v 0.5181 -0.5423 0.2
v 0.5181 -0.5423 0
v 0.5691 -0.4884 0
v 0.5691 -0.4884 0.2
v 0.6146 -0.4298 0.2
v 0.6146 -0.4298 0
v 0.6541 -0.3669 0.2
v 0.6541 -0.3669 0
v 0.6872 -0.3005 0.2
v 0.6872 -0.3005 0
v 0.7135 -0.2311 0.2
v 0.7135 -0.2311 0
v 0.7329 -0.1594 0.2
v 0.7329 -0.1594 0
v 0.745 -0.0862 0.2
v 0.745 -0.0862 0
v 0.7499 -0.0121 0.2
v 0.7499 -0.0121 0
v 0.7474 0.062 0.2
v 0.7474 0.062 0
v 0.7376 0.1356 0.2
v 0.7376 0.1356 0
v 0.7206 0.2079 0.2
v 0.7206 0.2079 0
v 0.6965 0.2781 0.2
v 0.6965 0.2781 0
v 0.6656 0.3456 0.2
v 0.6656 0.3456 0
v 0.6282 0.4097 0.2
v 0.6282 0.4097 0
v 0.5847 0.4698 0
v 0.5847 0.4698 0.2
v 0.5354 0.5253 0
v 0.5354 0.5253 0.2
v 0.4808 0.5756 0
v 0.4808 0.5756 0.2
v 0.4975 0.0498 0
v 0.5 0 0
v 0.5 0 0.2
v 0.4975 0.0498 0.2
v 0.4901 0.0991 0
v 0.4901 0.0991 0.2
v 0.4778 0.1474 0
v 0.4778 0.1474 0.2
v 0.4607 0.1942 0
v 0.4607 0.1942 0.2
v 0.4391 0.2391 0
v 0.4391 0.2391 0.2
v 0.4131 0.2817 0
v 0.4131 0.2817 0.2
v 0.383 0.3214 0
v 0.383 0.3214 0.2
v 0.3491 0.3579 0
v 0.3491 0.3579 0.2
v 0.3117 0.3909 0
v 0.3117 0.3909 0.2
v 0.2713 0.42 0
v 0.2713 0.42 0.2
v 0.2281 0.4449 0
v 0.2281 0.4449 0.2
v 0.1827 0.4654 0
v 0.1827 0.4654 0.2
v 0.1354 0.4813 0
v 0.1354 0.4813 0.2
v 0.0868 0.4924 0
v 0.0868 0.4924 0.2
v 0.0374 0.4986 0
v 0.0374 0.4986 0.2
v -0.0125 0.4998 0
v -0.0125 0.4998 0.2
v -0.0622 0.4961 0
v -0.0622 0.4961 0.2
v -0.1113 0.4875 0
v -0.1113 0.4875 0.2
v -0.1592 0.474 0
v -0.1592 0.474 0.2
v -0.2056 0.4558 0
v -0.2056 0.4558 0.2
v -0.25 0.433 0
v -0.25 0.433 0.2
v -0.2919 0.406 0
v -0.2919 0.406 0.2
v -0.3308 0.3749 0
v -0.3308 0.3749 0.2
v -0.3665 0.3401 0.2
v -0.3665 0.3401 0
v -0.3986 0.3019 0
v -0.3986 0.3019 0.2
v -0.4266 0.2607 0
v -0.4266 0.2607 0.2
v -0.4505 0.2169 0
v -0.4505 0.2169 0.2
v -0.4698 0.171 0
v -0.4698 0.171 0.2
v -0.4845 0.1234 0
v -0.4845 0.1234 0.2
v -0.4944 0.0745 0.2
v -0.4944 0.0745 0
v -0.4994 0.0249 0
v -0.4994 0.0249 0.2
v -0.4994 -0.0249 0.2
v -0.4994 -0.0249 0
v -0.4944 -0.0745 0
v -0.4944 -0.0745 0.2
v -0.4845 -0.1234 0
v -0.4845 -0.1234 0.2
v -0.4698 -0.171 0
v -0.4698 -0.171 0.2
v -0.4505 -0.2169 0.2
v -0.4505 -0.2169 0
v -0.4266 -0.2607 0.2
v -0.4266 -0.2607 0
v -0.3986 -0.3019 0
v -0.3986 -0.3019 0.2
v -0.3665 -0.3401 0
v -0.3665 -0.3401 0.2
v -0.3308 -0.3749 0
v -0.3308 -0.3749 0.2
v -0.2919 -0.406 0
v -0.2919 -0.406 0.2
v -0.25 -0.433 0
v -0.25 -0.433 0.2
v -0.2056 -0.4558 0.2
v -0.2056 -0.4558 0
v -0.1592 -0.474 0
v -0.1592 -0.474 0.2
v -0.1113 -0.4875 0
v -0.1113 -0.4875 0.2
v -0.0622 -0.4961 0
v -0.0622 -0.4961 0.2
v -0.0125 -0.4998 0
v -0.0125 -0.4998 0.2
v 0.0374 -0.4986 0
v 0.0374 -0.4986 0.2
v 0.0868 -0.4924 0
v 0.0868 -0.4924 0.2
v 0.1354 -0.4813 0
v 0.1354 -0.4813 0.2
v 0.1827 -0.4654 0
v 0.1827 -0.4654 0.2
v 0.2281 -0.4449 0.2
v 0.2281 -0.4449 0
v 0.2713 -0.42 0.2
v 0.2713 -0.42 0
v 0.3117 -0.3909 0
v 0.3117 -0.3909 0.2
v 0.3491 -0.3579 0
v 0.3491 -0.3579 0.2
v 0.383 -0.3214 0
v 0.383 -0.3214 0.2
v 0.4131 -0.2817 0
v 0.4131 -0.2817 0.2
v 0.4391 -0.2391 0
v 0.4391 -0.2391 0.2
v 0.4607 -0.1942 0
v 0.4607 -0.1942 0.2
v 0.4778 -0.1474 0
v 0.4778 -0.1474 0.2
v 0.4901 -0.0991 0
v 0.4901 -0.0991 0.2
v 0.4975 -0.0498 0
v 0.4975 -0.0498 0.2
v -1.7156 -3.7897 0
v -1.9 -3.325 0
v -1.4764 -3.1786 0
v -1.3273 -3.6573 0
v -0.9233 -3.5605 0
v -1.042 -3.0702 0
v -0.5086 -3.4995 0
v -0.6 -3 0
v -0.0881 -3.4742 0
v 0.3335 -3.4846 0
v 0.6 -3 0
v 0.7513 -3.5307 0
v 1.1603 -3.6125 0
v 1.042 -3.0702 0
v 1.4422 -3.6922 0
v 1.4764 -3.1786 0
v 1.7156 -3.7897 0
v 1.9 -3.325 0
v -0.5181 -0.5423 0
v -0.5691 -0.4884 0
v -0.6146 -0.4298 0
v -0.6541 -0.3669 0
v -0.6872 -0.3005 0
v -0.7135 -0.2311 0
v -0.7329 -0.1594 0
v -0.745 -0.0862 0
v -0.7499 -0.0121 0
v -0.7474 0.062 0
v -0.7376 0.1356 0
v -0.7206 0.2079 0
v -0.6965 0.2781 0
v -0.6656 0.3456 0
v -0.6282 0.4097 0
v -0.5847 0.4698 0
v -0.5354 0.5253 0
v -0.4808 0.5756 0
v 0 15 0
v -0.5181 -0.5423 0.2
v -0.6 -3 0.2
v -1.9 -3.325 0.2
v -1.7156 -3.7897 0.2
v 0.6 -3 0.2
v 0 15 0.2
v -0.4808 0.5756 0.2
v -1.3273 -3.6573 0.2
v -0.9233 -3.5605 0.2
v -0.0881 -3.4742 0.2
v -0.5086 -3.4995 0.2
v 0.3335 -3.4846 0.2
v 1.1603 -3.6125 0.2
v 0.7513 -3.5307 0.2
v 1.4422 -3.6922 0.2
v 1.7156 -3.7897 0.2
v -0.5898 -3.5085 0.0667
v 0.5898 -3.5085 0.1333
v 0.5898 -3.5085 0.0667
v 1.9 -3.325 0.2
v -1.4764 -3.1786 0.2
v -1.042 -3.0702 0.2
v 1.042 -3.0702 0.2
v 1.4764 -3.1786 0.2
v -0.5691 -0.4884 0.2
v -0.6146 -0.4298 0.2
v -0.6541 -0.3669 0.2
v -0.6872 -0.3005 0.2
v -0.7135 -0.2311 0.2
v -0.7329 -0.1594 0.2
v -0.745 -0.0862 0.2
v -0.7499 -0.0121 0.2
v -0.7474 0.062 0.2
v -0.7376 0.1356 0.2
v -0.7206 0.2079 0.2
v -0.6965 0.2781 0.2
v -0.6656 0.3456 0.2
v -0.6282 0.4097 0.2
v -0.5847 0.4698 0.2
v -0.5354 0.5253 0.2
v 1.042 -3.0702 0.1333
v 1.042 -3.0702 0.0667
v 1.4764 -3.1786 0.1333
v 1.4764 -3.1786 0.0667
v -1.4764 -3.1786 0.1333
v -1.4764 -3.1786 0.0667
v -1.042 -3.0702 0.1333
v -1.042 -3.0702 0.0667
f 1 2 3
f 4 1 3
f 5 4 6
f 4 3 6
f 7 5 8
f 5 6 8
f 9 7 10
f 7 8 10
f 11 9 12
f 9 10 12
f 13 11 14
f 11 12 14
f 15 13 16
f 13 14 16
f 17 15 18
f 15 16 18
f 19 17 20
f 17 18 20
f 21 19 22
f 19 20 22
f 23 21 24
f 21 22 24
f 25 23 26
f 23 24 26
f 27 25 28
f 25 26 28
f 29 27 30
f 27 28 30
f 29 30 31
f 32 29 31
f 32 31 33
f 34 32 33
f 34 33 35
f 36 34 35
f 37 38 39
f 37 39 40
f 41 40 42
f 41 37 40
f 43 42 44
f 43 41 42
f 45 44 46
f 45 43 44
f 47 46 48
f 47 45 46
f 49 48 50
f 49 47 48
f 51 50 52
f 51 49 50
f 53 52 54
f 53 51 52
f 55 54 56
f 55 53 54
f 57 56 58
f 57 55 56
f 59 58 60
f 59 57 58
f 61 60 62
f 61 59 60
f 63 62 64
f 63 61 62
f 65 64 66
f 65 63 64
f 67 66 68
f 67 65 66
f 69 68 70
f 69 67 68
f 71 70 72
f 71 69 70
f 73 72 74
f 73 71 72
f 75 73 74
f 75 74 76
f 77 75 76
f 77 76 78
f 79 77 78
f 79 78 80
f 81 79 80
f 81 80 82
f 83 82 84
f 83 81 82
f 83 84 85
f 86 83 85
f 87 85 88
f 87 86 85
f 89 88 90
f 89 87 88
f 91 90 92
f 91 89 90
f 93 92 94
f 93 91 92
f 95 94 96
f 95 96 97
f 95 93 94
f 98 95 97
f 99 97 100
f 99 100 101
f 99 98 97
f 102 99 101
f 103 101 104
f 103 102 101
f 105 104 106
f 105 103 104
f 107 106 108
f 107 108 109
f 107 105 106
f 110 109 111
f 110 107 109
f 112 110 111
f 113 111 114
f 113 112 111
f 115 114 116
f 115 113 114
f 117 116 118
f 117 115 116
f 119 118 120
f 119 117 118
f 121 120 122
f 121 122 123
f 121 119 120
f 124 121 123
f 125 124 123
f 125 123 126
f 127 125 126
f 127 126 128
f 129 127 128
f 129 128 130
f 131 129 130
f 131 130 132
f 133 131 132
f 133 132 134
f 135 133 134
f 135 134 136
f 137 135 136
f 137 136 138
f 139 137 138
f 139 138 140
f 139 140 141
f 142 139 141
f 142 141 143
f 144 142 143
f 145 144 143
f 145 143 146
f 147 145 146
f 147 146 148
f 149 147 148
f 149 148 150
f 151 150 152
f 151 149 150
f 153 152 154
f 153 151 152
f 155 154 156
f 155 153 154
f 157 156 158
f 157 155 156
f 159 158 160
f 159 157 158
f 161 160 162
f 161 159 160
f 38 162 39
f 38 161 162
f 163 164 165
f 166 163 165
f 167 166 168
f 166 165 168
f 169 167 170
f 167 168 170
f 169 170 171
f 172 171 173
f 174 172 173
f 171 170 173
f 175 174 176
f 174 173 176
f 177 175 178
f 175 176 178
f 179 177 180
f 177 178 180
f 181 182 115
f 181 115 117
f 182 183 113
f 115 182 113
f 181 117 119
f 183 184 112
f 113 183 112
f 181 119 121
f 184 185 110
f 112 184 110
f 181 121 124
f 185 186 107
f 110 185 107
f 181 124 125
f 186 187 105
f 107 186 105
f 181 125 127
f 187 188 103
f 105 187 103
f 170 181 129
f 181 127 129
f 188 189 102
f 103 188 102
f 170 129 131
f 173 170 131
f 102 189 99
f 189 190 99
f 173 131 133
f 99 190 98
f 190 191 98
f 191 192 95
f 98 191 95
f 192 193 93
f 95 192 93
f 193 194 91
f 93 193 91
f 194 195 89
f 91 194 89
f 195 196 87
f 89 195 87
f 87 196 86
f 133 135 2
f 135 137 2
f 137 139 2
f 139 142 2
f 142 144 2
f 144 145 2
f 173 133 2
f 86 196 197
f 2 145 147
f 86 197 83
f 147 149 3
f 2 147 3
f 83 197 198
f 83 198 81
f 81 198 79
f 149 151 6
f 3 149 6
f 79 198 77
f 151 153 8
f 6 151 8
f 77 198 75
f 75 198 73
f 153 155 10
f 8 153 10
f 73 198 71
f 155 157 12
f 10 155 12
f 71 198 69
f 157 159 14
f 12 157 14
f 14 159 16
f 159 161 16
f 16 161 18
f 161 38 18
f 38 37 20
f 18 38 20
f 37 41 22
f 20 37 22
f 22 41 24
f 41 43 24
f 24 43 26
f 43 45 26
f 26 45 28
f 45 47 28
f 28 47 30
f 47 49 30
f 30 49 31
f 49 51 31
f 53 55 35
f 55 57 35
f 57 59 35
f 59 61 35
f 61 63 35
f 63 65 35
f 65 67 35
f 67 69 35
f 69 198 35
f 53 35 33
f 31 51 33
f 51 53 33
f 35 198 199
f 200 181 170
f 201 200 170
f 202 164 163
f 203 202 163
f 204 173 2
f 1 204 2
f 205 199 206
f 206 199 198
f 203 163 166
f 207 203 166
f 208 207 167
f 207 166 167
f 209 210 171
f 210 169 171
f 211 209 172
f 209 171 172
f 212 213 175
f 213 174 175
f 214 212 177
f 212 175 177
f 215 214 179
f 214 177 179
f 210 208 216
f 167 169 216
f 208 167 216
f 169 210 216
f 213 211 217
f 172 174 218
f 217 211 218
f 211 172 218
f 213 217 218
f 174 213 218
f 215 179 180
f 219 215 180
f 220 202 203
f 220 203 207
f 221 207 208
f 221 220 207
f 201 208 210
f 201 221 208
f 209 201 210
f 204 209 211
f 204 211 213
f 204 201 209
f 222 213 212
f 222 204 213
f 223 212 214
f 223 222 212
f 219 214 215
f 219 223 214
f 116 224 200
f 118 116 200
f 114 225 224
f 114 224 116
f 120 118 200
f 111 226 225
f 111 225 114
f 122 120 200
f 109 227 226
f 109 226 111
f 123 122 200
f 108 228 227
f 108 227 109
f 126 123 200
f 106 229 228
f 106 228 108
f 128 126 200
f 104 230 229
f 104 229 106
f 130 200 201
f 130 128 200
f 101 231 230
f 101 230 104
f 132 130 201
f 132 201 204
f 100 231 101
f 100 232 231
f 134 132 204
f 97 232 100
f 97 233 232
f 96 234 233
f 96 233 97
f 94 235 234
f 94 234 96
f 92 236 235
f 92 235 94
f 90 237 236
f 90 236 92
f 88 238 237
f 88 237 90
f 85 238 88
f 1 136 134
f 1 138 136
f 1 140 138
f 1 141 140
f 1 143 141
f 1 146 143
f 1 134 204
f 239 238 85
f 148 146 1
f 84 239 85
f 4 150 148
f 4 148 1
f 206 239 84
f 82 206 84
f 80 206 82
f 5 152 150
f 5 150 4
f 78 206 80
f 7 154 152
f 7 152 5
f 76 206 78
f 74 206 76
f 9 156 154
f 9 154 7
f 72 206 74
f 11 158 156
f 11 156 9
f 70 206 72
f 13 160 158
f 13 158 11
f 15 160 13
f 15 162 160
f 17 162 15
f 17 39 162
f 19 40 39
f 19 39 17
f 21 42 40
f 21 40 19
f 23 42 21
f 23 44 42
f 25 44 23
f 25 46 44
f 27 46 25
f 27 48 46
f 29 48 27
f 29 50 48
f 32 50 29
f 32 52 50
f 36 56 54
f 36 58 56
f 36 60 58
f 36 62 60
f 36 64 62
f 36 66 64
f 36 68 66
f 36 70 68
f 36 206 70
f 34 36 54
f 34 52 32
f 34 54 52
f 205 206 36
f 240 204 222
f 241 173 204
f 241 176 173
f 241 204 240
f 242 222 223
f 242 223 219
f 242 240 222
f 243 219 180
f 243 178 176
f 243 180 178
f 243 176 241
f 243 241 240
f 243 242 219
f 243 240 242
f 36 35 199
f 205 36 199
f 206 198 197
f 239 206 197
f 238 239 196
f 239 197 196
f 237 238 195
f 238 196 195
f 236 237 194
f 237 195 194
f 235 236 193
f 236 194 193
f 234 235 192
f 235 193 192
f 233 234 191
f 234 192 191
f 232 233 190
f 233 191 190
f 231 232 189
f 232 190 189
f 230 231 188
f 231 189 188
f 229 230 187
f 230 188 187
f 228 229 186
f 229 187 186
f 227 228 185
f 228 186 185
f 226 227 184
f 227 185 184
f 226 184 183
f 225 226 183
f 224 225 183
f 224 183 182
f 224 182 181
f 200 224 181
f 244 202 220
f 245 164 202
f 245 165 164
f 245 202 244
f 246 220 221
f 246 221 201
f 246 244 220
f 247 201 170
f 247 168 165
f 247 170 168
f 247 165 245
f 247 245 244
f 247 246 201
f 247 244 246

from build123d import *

# Parameters (mm, degrees)
CROQUIS1_R              = 0.75
CROQUIS1_R_2            = 0.5
SALIENTE_EXTRUIR1_DEPTH = 0.2


with BuildPart() as part:
    # Croquis1 → Saliente-Extruir1 (new body)
    with BuildSketch(Plane.XY):
        with BuildLine():
            Line((0.480813239, 0.57560284), (0, 15))
            Line((0, 15), (-0.480813239, 0.57560284))
            ThreePointArc((-0.480813239, 0.57560284), (0, 0.75), (0.480813239, 0.57560284))
        make_face()
        Circle(CROQUIS1_R)
        Circle(CROQUIS1_R_2, mode=Mode.SUBTRACT)
        with BuildLine():
            ThreePointArc((0.518076883, -0.542306503), (0, -0.75), (-0.518076883, -0.542306503))
            Line((-0.518076883, -0.542306503), (-0.6, -3))
            add(Edge.make_bspline(
                [(-0.6, -3), (-0.201744862, -2.954169047), (0.201744862, -2.954169047), (0.6, -3)],
                knots=[0.345361209, 0.345361209, 0.345361209, 0.345361209, 0.654638791, 0.654638791, 0.654638791, 0.654638791], degree=3))
            Line((0.6, -3), (0.518076883, -0.542306503))
        make_face()
        with BuildLine():
            add(Edge.make_bspline(
                [(-0.6, -3), (-0.201744862, -2.954169047), (0.201744862, -2.954169047), (0.6, -3)],
                knots=[0.345361209, 0.345361209, 0.345361209, 0.345361209, 0.654638791, 0.654638791, 0.654638791, 0.654638791], degree=3))
            add(Edge.make_bspline(
                [(-1.9, -3.324981437), (-1.482912392, -3.159505228), (-1.044719839, -3.051178082), (-0.6, -3)],
                knots=[0, 0, 0, 0, 0.345361209, 0.345361209, 0.345361209, 0.345361209], degree=3))
            Line((-1.9, -3.324981437), (-1.71561069, -3.789740065))
            add(Edge.make_bspline(
                [(-1.71561069, -3.789740065), (-0.652484196, -3.367953038), (0.652484196, -3.367953038), (1.71561069, -3.789740065)],
                knots=[0, 0, 0, 0, 1, 1, 1, 1], degree=3))
            Line((1.71561069, -3.789740065), (1.9, -3.324981437))
            add(Edge.make_bspline(
                [(0.6, -3), (1.044719839, -3.051178082), (1.482912392, -3.159505228), (1.9, -3.324981437)],
                knots=[0.654638791, 0.654638791, 0.654638791, 0.654638791, 1, 1, 1, 1], degree=3))
        make_face()
    extrude(amount=SALIENTE_EXTRUIR1_DEPTH)


solid = part.part
